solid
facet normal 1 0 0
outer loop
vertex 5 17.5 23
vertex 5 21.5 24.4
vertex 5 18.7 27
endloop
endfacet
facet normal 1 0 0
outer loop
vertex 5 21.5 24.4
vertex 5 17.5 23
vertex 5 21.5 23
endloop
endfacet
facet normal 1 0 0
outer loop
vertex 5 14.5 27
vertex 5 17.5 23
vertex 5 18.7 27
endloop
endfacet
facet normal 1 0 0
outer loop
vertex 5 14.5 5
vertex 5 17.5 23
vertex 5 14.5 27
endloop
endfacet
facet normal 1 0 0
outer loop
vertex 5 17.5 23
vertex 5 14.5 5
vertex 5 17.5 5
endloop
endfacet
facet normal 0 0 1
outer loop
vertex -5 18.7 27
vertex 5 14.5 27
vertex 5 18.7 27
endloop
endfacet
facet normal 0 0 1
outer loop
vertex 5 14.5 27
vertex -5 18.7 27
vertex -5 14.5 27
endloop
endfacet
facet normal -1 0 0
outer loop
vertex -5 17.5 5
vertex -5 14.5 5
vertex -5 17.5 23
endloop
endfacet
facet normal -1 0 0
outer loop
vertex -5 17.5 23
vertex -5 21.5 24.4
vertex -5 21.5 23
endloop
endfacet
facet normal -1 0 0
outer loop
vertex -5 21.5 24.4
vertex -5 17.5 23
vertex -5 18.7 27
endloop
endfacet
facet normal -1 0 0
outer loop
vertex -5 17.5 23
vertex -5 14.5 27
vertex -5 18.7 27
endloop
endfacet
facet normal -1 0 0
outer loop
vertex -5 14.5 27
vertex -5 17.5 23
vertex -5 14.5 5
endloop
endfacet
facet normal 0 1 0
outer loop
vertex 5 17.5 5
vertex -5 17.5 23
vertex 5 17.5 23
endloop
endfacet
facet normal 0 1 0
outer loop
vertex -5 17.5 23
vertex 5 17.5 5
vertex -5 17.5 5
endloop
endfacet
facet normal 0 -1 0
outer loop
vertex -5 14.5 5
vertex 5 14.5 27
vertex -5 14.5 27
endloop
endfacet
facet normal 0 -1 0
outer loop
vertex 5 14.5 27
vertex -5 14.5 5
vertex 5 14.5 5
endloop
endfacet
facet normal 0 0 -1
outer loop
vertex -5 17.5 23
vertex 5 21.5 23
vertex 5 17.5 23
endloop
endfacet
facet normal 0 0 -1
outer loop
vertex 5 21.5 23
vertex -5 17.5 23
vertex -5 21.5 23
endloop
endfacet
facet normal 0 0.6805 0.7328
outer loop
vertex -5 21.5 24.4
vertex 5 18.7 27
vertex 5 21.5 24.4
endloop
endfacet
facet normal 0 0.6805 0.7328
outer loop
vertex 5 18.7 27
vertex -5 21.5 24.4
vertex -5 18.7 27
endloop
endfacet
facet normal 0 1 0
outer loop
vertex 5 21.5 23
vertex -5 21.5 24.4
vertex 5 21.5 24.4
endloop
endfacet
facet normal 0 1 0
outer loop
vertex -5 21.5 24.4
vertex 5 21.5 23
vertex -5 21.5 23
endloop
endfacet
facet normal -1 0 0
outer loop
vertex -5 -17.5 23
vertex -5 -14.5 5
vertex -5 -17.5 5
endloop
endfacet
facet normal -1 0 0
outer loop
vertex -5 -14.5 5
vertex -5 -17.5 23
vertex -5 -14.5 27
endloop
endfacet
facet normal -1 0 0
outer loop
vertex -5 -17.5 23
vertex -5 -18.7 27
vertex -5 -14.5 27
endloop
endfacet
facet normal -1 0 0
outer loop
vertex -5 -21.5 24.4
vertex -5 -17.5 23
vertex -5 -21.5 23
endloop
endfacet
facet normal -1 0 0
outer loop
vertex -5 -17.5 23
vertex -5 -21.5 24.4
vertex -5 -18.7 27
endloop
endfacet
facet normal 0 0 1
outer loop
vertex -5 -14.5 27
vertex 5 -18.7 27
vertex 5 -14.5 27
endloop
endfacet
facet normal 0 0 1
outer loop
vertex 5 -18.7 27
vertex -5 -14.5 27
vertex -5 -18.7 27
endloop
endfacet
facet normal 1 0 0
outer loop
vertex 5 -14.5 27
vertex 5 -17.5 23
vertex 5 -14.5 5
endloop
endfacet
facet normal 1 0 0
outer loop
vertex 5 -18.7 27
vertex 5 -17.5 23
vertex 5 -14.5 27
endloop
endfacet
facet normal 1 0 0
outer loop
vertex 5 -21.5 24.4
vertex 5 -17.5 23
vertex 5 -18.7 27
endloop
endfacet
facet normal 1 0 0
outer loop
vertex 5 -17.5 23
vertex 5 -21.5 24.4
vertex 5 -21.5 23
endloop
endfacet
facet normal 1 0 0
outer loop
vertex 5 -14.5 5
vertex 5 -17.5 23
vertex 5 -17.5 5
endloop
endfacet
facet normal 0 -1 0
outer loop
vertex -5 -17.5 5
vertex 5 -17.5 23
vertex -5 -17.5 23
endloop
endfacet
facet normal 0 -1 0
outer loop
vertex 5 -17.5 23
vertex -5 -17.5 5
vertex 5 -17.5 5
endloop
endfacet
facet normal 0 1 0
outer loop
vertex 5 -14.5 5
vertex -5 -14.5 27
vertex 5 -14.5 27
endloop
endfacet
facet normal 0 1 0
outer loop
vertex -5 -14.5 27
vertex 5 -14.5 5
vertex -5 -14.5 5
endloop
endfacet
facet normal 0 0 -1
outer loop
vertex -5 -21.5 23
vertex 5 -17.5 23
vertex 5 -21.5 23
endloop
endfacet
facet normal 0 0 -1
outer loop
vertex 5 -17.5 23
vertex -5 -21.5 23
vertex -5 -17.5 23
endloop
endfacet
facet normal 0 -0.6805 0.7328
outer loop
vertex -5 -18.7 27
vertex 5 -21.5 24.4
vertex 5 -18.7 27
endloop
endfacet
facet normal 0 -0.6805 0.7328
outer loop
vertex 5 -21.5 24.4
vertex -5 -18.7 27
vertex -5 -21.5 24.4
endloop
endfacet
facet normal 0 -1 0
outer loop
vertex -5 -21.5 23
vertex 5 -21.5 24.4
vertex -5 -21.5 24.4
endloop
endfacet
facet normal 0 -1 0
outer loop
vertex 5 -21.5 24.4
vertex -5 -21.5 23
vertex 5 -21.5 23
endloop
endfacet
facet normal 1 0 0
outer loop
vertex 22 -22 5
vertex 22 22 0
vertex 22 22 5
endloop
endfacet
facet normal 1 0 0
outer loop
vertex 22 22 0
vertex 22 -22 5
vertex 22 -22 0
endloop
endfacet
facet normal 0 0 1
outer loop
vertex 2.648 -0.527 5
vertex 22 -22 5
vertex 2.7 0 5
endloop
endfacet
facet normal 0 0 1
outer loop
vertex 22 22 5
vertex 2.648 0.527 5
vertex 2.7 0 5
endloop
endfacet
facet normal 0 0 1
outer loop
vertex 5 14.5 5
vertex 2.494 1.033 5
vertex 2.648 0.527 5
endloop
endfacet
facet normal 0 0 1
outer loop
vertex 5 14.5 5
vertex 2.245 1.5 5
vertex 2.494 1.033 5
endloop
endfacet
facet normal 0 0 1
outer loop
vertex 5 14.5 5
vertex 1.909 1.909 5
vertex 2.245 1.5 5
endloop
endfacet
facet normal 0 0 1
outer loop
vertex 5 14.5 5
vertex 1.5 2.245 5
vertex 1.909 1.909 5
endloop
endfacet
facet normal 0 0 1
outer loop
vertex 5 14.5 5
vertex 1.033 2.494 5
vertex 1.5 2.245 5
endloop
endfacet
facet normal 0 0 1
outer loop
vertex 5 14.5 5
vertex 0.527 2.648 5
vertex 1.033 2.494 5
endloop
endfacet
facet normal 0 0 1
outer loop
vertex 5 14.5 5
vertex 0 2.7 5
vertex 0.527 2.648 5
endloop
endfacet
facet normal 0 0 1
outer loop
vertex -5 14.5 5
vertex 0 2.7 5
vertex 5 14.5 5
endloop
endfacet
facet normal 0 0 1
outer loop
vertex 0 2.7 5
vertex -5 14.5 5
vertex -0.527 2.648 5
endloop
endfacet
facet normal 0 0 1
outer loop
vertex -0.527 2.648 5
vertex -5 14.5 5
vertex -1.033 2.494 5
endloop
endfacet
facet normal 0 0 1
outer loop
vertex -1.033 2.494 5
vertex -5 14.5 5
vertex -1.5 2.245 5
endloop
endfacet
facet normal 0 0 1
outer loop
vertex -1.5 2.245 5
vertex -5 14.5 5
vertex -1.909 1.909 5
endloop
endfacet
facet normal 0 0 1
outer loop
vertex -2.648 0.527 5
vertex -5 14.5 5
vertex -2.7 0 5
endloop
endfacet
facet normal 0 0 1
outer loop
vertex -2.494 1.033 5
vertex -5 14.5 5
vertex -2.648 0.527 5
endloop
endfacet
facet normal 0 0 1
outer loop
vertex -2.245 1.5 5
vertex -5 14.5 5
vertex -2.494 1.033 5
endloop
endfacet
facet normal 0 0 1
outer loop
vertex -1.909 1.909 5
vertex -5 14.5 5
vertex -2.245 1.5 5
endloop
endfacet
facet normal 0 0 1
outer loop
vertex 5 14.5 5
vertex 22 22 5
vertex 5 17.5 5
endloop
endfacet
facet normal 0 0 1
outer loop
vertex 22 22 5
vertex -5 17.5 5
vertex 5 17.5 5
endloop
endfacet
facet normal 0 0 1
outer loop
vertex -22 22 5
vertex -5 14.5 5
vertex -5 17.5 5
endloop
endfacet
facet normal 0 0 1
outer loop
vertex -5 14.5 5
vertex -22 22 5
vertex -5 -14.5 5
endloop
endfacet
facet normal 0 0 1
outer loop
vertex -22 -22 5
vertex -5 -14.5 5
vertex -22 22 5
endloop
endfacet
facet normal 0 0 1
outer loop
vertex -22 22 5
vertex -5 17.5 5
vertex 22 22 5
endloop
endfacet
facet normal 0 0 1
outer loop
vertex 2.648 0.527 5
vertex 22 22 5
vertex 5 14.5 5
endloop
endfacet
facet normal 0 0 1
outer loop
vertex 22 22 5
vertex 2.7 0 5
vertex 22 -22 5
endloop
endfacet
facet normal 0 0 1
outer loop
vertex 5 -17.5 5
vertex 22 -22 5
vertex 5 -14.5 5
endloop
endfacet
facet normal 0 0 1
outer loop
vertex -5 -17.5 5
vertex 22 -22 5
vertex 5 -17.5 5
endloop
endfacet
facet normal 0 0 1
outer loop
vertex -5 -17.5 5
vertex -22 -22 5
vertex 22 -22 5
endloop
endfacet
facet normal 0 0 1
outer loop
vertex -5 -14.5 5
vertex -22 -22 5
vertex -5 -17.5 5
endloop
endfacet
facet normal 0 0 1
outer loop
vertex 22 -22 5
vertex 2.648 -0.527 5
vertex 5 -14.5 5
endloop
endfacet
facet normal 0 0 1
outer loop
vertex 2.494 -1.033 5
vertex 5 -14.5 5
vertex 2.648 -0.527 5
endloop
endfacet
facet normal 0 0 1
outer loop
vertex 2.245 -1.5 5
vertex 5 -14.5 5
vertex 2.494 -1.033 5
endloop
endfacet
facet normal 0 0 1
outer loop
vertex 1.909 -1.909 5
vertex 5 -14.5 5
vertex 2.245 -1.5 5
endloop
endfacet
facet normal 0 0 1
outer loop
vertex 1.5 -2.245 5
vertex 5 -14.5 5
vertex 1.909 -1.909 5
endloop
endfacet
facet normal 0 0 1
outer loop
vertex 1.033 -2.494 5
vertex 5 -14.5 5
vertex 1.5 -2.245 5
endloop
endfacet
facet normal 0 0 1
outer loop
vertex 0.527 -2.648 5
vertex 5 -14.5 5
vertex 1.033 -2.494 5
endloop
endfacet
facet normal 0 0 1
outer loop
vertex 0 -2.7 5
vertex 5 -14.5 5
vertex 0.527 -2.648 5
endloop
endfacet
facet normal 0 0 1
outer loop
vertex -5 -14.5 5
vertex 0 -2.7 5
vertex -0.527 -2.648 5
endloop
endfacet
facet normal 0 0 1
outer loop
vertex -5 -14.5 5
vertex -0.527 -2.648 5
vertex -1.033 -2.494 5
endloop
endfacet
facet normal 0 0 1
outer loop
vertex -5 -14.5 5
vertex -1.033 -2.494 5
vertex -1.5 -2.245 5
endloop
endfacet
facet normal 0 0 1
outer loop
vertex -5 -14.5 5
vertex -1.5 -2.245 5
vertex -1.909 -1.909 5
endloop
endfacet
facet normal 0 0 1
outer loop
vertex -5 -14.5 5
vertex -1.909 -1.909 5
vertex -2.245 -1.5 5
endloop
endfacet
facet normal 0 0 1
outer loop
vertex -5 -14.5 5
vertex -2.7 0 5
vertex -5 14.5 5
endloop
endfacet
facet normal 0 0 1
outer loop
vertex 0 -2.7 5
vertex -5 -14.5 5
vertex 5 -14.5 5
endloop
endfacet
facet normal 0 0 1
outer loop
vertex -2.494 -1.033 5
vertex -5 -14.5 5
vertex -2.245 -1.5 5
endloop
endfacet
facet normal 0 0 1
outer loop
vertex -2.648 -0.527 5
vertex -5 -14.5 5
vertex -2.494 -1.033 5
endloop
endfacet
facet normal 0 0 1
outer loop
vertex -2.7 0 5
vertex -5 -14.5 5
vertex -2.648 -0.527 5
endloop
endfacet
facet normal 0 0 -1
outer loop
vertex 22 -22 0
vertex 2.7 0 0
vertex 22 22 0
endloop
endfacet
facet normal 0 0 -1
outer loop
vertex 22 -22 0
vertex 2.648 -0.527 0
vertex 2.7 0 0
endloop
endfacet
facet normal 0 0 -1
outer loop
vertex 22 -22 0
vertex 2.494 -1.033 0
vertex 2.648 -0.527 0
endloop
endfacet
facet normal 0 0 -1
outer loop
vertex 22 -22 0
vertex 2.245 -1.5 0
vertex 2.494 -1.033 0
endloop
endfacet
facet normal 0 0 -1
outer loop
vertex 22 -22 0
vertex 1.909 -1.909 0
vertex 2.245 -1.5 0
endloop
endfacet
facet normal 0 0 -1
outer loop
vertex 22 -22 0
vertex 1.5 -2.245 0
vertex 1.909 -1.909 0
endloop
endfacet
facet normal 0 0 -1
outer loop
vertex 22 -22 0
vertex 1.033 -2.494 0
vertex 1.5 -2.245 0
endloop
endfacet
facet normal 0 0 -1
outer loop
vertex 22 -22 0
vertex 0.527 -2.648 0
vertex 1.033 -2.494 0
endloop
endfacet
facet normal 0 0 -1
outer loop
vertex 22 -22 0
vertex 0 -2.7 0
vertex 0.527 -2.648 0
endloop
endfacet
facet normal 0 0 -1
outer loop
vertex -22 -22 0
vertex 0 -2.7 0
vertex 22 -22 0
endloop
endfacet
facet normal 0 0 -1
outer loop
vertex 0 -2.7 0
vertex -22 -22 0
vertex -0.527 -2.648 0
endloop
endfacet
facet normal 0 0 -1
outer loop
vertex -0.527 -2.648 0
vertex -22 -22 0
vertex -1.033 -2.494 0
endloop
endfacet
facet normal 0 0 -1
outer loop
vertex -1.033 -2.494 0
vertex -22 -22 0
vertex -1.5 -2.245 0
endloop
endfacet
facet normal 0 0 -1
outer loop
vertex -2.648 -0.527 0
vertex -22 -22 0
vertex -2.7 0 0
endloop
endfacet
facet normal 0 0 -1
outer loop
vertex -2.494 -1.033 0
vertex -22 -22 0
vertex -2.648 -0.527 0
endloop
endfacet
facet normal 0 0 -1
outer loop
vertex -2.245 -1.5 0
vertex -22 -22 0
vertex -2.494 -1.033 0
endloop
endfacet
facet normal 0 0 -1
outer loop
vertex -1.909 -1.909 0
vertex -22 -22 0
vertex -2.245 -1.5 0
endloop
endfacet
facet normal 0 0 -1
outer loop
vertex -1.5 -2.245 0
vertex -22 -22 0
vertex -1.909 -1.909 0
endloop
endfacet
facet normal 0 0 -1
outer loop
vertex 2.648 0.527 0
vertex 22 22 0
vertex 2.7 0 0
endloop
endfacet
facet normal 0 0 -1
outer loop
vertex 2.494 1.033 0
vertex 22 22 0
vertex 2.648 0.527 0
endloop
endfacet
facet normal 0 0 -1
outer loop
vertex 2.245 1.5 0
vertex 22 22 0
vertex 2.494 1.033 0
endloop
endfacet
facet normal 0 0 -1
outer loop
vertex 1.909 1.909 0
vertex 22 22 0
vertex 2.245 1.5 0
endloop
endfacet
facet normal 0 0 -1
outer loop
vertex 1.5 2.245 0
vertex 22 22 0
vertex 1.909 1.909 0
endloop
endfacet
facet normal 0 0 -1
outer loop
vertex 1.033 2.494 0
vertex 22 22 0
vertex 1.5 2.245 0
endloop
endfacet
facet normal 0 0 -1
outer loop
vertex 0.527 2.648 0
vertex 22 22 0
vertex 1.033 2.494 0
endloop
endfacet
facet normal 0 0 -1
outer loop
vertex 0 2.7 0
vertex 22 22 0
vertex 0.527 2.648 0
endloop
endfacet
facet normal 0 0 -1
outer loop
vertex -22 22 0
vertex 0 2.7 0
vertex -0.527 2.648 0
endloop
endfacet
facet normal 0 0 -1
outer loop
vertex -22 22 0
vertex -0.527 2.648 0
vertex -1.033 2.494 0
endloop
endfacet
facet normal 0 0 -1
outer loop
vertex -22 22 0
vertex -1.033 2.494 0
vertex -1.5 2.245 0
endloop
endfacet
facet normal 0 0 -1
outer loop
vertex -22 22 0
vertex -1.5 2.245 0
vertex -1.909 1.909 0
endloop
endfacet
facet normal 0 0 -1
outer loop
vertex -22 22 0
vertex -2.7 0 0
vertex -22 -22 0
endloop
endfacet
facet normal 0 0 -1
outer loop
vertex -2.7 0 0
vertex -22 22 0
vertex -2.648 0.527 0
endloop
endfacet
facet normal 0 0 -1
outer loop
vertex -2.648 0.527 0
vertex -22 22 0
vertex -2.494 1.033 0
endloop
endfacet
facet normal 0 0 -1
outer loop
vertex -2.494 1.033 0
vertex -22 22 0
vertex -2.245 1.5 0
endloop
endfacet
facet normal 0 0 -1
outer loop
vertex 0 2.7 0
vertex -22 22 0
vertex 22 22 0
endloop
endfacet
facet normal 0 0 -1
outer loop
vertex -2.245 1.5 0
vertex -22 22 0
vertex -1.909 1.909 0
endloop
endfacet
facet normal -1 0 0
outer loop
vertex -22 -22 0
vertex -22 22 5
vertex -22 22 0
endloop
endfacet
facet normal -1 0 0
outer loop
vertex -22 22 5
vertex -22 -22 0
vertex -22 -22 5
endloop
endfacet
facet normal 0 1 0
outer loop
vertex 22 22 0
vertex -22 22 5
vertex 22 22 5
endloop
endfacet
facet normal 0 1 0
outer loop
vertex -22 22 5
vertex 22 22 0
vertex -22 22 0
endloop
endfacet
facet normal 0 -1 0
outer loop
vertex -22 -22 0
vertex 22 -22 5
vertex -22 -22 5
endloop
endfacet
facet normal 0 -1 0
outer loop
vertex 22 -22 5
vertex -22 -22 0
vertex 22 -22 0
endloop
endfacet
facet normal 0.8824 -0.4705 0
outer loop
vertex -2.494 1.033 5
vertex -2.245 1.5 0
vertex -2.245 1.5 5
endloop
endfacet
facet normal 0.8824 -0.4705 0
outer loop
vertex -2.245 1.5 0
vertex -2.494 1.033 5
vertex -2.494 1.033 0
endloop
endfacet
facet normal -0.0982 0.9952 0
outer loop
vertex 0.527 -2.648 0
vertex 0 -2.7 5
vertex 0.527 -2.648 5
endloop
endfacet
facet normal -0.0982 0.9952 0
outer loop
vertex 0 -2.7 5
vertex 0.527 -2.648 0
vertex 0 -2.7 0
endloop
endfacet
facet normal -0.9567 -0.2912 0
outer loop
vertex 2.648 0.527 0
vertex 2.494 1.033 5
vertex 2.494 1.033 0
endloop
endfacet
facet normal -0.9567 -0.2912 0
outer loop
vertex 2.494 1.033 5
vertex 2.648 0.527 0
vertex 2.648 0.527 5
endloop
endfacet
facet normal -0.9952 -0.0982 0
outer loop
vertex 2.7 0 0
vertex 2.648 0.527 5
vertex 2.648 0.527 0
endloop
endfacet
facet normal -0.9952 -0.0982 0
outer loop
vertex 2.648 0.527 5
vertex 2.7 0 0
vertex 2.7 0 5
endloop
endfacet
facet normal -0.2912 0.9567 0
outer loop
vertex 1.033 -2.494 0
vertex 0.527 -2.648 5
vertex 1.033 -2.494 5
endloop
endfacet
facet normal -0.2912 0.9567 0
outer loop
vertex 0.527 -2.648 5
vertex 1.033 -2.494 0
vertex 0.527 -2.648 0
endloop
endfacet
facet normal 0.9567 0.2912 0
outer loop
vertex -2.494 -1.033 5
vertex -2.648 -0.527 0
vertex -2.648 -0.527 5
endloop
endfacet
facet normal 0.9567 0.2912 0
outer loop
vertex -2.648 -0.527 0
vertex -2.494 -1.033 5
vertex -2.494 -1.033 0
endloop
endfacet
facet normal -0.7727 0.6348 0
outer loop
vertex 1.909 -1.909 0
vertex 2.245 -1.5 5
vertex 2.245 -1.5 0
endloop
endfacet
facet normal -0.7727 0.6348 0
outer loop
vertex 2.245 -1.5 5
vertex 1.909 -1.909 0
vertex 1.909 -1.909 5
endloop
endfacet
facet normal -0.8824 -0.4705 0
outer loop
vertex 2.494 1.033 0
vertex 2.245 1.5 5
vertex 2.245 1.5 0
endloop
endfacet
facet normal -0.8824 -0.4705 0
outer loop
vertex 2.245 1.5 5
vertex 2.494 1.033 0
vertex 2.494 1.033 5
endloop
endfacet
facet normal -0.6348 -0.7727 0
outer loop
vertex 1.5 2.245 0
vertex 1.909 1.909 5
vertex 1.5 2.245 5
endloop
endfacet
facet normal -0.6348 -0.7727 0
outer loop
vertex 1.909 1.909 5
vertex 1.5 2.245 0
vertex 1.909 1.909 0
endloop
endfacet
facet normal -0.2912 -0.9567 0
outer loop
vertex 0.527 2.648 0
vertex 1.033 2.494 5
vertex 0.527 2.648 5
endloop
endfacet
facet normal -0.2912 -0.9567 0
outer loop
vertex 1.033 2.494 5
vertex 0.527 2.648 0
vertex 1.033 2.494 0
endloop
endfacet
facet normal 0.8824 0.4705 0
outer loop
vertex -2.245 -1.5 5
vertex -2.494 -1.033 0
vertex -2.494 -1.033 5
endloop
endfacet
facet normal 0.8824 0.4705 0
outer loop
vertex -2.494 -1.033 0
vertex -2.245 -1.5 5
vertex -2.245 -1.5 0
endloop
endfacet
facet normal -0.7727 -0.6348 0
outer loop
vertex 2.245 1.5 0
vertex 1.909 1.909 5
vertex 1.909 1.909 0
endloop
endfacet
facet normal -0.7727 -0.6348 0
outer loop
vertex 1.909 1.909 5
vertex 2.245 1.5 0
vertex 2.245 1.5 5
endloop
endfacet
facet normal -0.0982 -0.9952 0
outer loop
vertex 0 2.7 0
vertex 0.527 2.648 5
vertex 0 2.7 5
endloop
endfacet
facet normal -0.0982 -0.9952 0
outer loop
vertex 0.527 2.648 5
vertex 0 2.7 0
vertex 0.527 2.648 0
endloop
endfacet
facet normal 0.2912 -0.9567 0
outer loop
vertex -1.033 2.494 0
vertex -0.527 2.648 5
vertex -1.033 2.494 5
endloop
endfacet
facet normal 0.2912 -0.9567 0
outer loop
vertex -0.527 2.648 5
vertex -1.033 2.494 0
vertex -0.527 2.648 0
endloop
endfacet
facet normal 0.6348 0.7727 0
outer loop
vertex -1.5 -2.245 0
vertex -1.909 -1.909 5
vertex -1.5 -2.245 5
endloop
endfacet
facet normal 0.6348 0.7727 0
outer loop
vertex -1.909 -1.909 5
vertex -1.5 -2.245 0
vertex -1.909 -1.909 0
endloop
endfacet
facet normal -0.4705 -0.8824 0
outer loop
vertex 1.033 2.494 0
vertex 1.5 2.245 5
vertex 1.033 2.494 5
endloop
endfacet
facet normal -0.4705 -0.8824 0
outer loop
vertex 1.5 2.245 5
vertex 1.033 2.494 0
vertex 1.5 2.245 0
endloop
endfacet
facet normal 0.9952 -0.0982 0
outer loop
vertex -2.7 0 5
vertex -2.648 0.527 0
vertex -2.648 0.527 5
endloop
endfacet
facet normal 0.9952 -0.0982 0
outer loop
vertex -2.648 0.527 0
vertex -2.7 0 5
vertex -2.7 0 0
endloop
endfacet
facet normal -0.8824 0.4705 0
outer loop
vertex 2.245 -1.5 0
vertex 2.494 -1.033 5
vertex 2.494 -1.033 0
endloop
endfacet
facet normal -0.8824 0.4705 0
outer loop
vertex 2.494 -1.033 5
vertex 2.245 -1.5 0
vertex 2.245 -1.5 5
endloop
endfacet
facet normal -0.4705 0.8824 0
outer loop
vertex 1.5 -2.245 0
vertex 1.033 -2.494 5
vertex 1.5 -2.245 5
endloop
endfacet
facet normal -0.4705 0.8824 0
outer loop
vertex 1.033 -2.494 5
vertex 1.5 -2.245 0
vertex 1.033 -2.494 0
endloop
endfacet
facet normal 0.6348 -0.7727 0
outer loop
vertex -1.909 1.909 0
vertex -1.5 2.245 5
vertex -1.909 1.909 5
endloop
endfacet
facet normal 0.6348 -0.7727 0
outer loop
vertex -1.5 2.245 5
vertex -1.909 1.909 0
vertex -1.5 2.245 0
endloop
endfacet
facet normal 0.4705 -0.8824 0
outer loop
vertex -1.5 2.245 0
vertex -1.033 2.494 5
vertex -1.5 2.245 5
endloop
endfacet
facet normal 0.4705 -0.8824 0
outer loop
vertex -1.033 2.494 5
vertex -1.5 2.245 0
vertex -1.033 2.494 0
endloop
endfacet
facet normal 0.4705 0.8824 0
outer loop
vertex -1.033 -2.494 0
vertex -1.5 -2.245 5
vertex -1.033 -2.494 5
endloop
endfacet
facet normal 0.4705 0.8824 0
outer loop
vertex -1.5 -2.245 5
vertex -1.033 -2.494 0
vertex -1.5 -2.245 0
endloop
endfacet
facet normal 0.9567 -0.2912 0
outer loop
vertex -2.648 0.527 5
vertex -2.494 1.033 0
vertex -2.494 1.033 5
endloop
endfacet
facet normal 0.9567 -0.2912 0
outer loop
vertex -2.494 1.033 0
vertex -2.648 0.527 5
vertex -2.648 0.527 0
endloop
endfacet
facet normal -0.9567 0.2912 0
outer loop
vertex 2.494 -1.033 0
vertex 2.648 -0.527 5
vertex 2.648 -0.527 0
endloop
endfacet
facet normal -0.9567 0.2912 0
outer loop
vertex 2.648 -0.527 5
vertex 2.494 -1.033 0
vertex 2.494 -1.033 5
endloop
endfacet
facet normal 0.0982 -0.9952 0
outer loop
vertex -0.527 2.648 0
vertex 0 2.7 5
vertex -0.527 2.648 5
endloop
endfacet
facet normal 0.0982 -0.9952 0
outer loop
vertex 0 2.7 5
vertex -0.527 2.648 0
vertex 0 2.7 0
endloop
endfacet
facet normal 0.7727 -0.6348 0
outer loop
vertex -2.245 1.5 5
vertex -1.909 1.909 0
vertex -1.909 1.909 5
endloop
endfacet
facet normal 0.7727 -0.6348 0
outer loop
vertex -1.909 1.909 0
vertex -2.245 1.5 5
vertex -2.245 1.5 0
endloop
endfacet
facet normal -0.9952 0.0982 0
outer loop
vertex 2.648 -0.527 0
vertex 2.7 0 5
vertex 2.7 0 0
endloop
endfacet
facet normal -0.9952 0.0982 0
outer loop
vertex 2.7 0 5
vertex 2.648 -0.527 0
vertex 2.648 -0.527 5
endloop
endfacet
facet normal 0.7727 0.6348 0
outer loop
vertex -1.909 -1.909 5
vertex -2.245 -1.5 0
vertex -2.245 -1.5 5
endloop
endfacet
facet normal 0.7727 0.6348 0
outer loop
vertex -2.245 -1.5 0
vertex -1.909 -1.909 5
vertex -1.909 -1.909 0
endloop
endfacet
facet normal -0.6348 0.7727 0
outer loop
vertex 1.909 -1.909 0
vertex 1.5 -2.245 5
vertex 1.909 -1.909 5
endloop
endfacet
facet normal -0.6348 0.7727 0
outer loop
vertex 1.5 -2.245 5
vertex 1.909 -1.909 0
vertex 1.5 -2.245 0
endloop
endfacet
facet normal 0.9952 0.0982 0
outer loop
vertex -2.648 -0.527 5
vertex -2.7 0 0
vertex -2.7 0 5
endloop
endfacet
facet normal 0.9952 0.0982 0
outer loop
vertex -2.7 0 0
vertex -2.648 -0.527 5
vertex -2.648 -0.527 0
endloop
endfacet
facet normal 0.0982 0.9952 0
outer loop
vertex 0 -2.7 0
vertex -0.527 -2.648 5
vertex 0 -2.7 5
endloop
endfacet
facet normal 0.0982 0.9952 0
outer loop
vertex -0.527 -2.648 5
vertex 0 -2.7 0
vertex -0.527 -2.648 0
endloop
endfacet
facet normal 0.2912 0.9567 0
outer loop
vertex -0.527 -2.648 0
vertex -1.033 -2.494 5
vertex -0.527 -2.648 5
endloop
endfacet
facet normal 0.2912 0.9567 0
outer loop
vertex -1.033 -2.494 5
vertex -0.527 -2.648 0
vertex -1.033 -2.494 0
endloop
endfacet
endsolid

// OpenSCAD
$fn = 32;

// ----------------------------------------------------------------------
// Snap-fit latch: 2 arms, 22 mm tall, 4.2 mm undercut hooks
// ----------------------------------------------------------------------

// --- parameters (mm) ---
base_d = 44;              // base plate depth
base_h = 5;               // base plate thickness
span = 32;                // distance between opposite arms
arm_t = 3;                // arm thickness
arm_d = 10;               // arm width
height = 22;              // free arm length
head_len = 4.2;           // hook reach
head_h = 4;               // hook height
lead = 1.4;               // lead-in ramp thickness
bore_d = 5.4;             // base fixing bore
top_z = 27;               // height of the arm tips above the base

arms = 2;

difference() {
  union() {
    /* base plate, centred on the arm ring */
    translate([-22, -22, 0]) cube([base_d, base_d, base_h]);
    for (a = [0 : 360 / arms : 359]) rotate([0, 0, a]) {
    /* arm, sunk 0.5 mm into the base */
    translate([-arm_d / 2, span / 2 - arm_t / 2, base_h - 0.5]) cube([arm_d, arm_t, height + 0.5]);
    /* hook: a convex hull of a tall inner block and a thin outer lip
       gives a flat undercut below and a lead-in ramp on top */
    hull() {
      translate([-arm_d / 2, span / 2 + arm_t / 2 - 0.6, top_z - head_h]) cube([arm_d, lead + 0.4, head_h]);
      translate([-arm_d / 2, span / 2 + arm_t / 2 - 0.2, top_z - head_h]) cube([arm_d, head_len, lead]);
    }
    }
  }
  translate([0, 0, -2.5]) cylinder(h = base_h + 5, d = bore_d);
}
